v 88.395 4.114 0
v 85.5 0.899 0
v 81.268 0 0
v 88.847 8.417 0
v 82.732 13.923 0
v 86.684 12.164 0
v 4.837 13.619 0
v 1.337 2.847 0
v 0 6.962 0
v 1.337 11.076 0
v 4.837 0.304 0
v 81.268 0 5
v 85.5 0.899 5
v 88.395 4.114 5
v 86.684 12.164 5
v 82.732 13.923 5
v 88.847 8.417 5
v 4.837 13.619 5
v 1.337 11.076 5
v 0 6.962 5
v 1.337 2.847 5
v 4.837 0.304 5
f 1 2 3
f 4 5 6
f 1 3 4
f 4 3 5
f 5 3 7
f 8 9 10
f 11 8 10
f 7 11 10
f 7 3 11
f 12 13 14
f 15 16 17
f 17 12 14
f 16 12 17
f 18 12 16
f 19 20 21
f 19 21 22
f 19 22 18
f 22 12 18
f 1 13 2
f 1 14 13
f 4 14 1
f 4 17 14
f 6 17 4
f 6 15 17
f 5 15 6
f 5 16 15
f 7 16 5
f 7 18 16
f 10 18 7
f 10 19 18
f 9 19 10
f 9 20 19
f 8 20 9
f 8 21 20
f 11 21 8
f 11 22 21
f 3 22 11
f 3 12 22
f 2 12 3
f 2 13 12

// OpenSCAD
$fn = 32;

// ----------------------------------------------------------------------
// Lever arm: two bosses 14 and 14 mm, 75 mm between centres
// ----------------------------------------------------------------------

// --- parameters (mm) ---
profile_height = 5;       // extrusion height
profile_points = 11;      // points of the closed outline

profile = [[0, 6.962], [1.337, 2.847], [4.837, 0.304], [81.268, 0], [85.5, 0.899], [88.395, 4.114], [88.847, 8.417], [86.684, 12.164], [82.732, 13.923], [4.837, 13.619], [1.337, 11.076]];  // single closed polygon, 11 points, counter clockwise

// --- the one profile operation ---
linear_extrude(height = profile_height) polygon(points = profile);
